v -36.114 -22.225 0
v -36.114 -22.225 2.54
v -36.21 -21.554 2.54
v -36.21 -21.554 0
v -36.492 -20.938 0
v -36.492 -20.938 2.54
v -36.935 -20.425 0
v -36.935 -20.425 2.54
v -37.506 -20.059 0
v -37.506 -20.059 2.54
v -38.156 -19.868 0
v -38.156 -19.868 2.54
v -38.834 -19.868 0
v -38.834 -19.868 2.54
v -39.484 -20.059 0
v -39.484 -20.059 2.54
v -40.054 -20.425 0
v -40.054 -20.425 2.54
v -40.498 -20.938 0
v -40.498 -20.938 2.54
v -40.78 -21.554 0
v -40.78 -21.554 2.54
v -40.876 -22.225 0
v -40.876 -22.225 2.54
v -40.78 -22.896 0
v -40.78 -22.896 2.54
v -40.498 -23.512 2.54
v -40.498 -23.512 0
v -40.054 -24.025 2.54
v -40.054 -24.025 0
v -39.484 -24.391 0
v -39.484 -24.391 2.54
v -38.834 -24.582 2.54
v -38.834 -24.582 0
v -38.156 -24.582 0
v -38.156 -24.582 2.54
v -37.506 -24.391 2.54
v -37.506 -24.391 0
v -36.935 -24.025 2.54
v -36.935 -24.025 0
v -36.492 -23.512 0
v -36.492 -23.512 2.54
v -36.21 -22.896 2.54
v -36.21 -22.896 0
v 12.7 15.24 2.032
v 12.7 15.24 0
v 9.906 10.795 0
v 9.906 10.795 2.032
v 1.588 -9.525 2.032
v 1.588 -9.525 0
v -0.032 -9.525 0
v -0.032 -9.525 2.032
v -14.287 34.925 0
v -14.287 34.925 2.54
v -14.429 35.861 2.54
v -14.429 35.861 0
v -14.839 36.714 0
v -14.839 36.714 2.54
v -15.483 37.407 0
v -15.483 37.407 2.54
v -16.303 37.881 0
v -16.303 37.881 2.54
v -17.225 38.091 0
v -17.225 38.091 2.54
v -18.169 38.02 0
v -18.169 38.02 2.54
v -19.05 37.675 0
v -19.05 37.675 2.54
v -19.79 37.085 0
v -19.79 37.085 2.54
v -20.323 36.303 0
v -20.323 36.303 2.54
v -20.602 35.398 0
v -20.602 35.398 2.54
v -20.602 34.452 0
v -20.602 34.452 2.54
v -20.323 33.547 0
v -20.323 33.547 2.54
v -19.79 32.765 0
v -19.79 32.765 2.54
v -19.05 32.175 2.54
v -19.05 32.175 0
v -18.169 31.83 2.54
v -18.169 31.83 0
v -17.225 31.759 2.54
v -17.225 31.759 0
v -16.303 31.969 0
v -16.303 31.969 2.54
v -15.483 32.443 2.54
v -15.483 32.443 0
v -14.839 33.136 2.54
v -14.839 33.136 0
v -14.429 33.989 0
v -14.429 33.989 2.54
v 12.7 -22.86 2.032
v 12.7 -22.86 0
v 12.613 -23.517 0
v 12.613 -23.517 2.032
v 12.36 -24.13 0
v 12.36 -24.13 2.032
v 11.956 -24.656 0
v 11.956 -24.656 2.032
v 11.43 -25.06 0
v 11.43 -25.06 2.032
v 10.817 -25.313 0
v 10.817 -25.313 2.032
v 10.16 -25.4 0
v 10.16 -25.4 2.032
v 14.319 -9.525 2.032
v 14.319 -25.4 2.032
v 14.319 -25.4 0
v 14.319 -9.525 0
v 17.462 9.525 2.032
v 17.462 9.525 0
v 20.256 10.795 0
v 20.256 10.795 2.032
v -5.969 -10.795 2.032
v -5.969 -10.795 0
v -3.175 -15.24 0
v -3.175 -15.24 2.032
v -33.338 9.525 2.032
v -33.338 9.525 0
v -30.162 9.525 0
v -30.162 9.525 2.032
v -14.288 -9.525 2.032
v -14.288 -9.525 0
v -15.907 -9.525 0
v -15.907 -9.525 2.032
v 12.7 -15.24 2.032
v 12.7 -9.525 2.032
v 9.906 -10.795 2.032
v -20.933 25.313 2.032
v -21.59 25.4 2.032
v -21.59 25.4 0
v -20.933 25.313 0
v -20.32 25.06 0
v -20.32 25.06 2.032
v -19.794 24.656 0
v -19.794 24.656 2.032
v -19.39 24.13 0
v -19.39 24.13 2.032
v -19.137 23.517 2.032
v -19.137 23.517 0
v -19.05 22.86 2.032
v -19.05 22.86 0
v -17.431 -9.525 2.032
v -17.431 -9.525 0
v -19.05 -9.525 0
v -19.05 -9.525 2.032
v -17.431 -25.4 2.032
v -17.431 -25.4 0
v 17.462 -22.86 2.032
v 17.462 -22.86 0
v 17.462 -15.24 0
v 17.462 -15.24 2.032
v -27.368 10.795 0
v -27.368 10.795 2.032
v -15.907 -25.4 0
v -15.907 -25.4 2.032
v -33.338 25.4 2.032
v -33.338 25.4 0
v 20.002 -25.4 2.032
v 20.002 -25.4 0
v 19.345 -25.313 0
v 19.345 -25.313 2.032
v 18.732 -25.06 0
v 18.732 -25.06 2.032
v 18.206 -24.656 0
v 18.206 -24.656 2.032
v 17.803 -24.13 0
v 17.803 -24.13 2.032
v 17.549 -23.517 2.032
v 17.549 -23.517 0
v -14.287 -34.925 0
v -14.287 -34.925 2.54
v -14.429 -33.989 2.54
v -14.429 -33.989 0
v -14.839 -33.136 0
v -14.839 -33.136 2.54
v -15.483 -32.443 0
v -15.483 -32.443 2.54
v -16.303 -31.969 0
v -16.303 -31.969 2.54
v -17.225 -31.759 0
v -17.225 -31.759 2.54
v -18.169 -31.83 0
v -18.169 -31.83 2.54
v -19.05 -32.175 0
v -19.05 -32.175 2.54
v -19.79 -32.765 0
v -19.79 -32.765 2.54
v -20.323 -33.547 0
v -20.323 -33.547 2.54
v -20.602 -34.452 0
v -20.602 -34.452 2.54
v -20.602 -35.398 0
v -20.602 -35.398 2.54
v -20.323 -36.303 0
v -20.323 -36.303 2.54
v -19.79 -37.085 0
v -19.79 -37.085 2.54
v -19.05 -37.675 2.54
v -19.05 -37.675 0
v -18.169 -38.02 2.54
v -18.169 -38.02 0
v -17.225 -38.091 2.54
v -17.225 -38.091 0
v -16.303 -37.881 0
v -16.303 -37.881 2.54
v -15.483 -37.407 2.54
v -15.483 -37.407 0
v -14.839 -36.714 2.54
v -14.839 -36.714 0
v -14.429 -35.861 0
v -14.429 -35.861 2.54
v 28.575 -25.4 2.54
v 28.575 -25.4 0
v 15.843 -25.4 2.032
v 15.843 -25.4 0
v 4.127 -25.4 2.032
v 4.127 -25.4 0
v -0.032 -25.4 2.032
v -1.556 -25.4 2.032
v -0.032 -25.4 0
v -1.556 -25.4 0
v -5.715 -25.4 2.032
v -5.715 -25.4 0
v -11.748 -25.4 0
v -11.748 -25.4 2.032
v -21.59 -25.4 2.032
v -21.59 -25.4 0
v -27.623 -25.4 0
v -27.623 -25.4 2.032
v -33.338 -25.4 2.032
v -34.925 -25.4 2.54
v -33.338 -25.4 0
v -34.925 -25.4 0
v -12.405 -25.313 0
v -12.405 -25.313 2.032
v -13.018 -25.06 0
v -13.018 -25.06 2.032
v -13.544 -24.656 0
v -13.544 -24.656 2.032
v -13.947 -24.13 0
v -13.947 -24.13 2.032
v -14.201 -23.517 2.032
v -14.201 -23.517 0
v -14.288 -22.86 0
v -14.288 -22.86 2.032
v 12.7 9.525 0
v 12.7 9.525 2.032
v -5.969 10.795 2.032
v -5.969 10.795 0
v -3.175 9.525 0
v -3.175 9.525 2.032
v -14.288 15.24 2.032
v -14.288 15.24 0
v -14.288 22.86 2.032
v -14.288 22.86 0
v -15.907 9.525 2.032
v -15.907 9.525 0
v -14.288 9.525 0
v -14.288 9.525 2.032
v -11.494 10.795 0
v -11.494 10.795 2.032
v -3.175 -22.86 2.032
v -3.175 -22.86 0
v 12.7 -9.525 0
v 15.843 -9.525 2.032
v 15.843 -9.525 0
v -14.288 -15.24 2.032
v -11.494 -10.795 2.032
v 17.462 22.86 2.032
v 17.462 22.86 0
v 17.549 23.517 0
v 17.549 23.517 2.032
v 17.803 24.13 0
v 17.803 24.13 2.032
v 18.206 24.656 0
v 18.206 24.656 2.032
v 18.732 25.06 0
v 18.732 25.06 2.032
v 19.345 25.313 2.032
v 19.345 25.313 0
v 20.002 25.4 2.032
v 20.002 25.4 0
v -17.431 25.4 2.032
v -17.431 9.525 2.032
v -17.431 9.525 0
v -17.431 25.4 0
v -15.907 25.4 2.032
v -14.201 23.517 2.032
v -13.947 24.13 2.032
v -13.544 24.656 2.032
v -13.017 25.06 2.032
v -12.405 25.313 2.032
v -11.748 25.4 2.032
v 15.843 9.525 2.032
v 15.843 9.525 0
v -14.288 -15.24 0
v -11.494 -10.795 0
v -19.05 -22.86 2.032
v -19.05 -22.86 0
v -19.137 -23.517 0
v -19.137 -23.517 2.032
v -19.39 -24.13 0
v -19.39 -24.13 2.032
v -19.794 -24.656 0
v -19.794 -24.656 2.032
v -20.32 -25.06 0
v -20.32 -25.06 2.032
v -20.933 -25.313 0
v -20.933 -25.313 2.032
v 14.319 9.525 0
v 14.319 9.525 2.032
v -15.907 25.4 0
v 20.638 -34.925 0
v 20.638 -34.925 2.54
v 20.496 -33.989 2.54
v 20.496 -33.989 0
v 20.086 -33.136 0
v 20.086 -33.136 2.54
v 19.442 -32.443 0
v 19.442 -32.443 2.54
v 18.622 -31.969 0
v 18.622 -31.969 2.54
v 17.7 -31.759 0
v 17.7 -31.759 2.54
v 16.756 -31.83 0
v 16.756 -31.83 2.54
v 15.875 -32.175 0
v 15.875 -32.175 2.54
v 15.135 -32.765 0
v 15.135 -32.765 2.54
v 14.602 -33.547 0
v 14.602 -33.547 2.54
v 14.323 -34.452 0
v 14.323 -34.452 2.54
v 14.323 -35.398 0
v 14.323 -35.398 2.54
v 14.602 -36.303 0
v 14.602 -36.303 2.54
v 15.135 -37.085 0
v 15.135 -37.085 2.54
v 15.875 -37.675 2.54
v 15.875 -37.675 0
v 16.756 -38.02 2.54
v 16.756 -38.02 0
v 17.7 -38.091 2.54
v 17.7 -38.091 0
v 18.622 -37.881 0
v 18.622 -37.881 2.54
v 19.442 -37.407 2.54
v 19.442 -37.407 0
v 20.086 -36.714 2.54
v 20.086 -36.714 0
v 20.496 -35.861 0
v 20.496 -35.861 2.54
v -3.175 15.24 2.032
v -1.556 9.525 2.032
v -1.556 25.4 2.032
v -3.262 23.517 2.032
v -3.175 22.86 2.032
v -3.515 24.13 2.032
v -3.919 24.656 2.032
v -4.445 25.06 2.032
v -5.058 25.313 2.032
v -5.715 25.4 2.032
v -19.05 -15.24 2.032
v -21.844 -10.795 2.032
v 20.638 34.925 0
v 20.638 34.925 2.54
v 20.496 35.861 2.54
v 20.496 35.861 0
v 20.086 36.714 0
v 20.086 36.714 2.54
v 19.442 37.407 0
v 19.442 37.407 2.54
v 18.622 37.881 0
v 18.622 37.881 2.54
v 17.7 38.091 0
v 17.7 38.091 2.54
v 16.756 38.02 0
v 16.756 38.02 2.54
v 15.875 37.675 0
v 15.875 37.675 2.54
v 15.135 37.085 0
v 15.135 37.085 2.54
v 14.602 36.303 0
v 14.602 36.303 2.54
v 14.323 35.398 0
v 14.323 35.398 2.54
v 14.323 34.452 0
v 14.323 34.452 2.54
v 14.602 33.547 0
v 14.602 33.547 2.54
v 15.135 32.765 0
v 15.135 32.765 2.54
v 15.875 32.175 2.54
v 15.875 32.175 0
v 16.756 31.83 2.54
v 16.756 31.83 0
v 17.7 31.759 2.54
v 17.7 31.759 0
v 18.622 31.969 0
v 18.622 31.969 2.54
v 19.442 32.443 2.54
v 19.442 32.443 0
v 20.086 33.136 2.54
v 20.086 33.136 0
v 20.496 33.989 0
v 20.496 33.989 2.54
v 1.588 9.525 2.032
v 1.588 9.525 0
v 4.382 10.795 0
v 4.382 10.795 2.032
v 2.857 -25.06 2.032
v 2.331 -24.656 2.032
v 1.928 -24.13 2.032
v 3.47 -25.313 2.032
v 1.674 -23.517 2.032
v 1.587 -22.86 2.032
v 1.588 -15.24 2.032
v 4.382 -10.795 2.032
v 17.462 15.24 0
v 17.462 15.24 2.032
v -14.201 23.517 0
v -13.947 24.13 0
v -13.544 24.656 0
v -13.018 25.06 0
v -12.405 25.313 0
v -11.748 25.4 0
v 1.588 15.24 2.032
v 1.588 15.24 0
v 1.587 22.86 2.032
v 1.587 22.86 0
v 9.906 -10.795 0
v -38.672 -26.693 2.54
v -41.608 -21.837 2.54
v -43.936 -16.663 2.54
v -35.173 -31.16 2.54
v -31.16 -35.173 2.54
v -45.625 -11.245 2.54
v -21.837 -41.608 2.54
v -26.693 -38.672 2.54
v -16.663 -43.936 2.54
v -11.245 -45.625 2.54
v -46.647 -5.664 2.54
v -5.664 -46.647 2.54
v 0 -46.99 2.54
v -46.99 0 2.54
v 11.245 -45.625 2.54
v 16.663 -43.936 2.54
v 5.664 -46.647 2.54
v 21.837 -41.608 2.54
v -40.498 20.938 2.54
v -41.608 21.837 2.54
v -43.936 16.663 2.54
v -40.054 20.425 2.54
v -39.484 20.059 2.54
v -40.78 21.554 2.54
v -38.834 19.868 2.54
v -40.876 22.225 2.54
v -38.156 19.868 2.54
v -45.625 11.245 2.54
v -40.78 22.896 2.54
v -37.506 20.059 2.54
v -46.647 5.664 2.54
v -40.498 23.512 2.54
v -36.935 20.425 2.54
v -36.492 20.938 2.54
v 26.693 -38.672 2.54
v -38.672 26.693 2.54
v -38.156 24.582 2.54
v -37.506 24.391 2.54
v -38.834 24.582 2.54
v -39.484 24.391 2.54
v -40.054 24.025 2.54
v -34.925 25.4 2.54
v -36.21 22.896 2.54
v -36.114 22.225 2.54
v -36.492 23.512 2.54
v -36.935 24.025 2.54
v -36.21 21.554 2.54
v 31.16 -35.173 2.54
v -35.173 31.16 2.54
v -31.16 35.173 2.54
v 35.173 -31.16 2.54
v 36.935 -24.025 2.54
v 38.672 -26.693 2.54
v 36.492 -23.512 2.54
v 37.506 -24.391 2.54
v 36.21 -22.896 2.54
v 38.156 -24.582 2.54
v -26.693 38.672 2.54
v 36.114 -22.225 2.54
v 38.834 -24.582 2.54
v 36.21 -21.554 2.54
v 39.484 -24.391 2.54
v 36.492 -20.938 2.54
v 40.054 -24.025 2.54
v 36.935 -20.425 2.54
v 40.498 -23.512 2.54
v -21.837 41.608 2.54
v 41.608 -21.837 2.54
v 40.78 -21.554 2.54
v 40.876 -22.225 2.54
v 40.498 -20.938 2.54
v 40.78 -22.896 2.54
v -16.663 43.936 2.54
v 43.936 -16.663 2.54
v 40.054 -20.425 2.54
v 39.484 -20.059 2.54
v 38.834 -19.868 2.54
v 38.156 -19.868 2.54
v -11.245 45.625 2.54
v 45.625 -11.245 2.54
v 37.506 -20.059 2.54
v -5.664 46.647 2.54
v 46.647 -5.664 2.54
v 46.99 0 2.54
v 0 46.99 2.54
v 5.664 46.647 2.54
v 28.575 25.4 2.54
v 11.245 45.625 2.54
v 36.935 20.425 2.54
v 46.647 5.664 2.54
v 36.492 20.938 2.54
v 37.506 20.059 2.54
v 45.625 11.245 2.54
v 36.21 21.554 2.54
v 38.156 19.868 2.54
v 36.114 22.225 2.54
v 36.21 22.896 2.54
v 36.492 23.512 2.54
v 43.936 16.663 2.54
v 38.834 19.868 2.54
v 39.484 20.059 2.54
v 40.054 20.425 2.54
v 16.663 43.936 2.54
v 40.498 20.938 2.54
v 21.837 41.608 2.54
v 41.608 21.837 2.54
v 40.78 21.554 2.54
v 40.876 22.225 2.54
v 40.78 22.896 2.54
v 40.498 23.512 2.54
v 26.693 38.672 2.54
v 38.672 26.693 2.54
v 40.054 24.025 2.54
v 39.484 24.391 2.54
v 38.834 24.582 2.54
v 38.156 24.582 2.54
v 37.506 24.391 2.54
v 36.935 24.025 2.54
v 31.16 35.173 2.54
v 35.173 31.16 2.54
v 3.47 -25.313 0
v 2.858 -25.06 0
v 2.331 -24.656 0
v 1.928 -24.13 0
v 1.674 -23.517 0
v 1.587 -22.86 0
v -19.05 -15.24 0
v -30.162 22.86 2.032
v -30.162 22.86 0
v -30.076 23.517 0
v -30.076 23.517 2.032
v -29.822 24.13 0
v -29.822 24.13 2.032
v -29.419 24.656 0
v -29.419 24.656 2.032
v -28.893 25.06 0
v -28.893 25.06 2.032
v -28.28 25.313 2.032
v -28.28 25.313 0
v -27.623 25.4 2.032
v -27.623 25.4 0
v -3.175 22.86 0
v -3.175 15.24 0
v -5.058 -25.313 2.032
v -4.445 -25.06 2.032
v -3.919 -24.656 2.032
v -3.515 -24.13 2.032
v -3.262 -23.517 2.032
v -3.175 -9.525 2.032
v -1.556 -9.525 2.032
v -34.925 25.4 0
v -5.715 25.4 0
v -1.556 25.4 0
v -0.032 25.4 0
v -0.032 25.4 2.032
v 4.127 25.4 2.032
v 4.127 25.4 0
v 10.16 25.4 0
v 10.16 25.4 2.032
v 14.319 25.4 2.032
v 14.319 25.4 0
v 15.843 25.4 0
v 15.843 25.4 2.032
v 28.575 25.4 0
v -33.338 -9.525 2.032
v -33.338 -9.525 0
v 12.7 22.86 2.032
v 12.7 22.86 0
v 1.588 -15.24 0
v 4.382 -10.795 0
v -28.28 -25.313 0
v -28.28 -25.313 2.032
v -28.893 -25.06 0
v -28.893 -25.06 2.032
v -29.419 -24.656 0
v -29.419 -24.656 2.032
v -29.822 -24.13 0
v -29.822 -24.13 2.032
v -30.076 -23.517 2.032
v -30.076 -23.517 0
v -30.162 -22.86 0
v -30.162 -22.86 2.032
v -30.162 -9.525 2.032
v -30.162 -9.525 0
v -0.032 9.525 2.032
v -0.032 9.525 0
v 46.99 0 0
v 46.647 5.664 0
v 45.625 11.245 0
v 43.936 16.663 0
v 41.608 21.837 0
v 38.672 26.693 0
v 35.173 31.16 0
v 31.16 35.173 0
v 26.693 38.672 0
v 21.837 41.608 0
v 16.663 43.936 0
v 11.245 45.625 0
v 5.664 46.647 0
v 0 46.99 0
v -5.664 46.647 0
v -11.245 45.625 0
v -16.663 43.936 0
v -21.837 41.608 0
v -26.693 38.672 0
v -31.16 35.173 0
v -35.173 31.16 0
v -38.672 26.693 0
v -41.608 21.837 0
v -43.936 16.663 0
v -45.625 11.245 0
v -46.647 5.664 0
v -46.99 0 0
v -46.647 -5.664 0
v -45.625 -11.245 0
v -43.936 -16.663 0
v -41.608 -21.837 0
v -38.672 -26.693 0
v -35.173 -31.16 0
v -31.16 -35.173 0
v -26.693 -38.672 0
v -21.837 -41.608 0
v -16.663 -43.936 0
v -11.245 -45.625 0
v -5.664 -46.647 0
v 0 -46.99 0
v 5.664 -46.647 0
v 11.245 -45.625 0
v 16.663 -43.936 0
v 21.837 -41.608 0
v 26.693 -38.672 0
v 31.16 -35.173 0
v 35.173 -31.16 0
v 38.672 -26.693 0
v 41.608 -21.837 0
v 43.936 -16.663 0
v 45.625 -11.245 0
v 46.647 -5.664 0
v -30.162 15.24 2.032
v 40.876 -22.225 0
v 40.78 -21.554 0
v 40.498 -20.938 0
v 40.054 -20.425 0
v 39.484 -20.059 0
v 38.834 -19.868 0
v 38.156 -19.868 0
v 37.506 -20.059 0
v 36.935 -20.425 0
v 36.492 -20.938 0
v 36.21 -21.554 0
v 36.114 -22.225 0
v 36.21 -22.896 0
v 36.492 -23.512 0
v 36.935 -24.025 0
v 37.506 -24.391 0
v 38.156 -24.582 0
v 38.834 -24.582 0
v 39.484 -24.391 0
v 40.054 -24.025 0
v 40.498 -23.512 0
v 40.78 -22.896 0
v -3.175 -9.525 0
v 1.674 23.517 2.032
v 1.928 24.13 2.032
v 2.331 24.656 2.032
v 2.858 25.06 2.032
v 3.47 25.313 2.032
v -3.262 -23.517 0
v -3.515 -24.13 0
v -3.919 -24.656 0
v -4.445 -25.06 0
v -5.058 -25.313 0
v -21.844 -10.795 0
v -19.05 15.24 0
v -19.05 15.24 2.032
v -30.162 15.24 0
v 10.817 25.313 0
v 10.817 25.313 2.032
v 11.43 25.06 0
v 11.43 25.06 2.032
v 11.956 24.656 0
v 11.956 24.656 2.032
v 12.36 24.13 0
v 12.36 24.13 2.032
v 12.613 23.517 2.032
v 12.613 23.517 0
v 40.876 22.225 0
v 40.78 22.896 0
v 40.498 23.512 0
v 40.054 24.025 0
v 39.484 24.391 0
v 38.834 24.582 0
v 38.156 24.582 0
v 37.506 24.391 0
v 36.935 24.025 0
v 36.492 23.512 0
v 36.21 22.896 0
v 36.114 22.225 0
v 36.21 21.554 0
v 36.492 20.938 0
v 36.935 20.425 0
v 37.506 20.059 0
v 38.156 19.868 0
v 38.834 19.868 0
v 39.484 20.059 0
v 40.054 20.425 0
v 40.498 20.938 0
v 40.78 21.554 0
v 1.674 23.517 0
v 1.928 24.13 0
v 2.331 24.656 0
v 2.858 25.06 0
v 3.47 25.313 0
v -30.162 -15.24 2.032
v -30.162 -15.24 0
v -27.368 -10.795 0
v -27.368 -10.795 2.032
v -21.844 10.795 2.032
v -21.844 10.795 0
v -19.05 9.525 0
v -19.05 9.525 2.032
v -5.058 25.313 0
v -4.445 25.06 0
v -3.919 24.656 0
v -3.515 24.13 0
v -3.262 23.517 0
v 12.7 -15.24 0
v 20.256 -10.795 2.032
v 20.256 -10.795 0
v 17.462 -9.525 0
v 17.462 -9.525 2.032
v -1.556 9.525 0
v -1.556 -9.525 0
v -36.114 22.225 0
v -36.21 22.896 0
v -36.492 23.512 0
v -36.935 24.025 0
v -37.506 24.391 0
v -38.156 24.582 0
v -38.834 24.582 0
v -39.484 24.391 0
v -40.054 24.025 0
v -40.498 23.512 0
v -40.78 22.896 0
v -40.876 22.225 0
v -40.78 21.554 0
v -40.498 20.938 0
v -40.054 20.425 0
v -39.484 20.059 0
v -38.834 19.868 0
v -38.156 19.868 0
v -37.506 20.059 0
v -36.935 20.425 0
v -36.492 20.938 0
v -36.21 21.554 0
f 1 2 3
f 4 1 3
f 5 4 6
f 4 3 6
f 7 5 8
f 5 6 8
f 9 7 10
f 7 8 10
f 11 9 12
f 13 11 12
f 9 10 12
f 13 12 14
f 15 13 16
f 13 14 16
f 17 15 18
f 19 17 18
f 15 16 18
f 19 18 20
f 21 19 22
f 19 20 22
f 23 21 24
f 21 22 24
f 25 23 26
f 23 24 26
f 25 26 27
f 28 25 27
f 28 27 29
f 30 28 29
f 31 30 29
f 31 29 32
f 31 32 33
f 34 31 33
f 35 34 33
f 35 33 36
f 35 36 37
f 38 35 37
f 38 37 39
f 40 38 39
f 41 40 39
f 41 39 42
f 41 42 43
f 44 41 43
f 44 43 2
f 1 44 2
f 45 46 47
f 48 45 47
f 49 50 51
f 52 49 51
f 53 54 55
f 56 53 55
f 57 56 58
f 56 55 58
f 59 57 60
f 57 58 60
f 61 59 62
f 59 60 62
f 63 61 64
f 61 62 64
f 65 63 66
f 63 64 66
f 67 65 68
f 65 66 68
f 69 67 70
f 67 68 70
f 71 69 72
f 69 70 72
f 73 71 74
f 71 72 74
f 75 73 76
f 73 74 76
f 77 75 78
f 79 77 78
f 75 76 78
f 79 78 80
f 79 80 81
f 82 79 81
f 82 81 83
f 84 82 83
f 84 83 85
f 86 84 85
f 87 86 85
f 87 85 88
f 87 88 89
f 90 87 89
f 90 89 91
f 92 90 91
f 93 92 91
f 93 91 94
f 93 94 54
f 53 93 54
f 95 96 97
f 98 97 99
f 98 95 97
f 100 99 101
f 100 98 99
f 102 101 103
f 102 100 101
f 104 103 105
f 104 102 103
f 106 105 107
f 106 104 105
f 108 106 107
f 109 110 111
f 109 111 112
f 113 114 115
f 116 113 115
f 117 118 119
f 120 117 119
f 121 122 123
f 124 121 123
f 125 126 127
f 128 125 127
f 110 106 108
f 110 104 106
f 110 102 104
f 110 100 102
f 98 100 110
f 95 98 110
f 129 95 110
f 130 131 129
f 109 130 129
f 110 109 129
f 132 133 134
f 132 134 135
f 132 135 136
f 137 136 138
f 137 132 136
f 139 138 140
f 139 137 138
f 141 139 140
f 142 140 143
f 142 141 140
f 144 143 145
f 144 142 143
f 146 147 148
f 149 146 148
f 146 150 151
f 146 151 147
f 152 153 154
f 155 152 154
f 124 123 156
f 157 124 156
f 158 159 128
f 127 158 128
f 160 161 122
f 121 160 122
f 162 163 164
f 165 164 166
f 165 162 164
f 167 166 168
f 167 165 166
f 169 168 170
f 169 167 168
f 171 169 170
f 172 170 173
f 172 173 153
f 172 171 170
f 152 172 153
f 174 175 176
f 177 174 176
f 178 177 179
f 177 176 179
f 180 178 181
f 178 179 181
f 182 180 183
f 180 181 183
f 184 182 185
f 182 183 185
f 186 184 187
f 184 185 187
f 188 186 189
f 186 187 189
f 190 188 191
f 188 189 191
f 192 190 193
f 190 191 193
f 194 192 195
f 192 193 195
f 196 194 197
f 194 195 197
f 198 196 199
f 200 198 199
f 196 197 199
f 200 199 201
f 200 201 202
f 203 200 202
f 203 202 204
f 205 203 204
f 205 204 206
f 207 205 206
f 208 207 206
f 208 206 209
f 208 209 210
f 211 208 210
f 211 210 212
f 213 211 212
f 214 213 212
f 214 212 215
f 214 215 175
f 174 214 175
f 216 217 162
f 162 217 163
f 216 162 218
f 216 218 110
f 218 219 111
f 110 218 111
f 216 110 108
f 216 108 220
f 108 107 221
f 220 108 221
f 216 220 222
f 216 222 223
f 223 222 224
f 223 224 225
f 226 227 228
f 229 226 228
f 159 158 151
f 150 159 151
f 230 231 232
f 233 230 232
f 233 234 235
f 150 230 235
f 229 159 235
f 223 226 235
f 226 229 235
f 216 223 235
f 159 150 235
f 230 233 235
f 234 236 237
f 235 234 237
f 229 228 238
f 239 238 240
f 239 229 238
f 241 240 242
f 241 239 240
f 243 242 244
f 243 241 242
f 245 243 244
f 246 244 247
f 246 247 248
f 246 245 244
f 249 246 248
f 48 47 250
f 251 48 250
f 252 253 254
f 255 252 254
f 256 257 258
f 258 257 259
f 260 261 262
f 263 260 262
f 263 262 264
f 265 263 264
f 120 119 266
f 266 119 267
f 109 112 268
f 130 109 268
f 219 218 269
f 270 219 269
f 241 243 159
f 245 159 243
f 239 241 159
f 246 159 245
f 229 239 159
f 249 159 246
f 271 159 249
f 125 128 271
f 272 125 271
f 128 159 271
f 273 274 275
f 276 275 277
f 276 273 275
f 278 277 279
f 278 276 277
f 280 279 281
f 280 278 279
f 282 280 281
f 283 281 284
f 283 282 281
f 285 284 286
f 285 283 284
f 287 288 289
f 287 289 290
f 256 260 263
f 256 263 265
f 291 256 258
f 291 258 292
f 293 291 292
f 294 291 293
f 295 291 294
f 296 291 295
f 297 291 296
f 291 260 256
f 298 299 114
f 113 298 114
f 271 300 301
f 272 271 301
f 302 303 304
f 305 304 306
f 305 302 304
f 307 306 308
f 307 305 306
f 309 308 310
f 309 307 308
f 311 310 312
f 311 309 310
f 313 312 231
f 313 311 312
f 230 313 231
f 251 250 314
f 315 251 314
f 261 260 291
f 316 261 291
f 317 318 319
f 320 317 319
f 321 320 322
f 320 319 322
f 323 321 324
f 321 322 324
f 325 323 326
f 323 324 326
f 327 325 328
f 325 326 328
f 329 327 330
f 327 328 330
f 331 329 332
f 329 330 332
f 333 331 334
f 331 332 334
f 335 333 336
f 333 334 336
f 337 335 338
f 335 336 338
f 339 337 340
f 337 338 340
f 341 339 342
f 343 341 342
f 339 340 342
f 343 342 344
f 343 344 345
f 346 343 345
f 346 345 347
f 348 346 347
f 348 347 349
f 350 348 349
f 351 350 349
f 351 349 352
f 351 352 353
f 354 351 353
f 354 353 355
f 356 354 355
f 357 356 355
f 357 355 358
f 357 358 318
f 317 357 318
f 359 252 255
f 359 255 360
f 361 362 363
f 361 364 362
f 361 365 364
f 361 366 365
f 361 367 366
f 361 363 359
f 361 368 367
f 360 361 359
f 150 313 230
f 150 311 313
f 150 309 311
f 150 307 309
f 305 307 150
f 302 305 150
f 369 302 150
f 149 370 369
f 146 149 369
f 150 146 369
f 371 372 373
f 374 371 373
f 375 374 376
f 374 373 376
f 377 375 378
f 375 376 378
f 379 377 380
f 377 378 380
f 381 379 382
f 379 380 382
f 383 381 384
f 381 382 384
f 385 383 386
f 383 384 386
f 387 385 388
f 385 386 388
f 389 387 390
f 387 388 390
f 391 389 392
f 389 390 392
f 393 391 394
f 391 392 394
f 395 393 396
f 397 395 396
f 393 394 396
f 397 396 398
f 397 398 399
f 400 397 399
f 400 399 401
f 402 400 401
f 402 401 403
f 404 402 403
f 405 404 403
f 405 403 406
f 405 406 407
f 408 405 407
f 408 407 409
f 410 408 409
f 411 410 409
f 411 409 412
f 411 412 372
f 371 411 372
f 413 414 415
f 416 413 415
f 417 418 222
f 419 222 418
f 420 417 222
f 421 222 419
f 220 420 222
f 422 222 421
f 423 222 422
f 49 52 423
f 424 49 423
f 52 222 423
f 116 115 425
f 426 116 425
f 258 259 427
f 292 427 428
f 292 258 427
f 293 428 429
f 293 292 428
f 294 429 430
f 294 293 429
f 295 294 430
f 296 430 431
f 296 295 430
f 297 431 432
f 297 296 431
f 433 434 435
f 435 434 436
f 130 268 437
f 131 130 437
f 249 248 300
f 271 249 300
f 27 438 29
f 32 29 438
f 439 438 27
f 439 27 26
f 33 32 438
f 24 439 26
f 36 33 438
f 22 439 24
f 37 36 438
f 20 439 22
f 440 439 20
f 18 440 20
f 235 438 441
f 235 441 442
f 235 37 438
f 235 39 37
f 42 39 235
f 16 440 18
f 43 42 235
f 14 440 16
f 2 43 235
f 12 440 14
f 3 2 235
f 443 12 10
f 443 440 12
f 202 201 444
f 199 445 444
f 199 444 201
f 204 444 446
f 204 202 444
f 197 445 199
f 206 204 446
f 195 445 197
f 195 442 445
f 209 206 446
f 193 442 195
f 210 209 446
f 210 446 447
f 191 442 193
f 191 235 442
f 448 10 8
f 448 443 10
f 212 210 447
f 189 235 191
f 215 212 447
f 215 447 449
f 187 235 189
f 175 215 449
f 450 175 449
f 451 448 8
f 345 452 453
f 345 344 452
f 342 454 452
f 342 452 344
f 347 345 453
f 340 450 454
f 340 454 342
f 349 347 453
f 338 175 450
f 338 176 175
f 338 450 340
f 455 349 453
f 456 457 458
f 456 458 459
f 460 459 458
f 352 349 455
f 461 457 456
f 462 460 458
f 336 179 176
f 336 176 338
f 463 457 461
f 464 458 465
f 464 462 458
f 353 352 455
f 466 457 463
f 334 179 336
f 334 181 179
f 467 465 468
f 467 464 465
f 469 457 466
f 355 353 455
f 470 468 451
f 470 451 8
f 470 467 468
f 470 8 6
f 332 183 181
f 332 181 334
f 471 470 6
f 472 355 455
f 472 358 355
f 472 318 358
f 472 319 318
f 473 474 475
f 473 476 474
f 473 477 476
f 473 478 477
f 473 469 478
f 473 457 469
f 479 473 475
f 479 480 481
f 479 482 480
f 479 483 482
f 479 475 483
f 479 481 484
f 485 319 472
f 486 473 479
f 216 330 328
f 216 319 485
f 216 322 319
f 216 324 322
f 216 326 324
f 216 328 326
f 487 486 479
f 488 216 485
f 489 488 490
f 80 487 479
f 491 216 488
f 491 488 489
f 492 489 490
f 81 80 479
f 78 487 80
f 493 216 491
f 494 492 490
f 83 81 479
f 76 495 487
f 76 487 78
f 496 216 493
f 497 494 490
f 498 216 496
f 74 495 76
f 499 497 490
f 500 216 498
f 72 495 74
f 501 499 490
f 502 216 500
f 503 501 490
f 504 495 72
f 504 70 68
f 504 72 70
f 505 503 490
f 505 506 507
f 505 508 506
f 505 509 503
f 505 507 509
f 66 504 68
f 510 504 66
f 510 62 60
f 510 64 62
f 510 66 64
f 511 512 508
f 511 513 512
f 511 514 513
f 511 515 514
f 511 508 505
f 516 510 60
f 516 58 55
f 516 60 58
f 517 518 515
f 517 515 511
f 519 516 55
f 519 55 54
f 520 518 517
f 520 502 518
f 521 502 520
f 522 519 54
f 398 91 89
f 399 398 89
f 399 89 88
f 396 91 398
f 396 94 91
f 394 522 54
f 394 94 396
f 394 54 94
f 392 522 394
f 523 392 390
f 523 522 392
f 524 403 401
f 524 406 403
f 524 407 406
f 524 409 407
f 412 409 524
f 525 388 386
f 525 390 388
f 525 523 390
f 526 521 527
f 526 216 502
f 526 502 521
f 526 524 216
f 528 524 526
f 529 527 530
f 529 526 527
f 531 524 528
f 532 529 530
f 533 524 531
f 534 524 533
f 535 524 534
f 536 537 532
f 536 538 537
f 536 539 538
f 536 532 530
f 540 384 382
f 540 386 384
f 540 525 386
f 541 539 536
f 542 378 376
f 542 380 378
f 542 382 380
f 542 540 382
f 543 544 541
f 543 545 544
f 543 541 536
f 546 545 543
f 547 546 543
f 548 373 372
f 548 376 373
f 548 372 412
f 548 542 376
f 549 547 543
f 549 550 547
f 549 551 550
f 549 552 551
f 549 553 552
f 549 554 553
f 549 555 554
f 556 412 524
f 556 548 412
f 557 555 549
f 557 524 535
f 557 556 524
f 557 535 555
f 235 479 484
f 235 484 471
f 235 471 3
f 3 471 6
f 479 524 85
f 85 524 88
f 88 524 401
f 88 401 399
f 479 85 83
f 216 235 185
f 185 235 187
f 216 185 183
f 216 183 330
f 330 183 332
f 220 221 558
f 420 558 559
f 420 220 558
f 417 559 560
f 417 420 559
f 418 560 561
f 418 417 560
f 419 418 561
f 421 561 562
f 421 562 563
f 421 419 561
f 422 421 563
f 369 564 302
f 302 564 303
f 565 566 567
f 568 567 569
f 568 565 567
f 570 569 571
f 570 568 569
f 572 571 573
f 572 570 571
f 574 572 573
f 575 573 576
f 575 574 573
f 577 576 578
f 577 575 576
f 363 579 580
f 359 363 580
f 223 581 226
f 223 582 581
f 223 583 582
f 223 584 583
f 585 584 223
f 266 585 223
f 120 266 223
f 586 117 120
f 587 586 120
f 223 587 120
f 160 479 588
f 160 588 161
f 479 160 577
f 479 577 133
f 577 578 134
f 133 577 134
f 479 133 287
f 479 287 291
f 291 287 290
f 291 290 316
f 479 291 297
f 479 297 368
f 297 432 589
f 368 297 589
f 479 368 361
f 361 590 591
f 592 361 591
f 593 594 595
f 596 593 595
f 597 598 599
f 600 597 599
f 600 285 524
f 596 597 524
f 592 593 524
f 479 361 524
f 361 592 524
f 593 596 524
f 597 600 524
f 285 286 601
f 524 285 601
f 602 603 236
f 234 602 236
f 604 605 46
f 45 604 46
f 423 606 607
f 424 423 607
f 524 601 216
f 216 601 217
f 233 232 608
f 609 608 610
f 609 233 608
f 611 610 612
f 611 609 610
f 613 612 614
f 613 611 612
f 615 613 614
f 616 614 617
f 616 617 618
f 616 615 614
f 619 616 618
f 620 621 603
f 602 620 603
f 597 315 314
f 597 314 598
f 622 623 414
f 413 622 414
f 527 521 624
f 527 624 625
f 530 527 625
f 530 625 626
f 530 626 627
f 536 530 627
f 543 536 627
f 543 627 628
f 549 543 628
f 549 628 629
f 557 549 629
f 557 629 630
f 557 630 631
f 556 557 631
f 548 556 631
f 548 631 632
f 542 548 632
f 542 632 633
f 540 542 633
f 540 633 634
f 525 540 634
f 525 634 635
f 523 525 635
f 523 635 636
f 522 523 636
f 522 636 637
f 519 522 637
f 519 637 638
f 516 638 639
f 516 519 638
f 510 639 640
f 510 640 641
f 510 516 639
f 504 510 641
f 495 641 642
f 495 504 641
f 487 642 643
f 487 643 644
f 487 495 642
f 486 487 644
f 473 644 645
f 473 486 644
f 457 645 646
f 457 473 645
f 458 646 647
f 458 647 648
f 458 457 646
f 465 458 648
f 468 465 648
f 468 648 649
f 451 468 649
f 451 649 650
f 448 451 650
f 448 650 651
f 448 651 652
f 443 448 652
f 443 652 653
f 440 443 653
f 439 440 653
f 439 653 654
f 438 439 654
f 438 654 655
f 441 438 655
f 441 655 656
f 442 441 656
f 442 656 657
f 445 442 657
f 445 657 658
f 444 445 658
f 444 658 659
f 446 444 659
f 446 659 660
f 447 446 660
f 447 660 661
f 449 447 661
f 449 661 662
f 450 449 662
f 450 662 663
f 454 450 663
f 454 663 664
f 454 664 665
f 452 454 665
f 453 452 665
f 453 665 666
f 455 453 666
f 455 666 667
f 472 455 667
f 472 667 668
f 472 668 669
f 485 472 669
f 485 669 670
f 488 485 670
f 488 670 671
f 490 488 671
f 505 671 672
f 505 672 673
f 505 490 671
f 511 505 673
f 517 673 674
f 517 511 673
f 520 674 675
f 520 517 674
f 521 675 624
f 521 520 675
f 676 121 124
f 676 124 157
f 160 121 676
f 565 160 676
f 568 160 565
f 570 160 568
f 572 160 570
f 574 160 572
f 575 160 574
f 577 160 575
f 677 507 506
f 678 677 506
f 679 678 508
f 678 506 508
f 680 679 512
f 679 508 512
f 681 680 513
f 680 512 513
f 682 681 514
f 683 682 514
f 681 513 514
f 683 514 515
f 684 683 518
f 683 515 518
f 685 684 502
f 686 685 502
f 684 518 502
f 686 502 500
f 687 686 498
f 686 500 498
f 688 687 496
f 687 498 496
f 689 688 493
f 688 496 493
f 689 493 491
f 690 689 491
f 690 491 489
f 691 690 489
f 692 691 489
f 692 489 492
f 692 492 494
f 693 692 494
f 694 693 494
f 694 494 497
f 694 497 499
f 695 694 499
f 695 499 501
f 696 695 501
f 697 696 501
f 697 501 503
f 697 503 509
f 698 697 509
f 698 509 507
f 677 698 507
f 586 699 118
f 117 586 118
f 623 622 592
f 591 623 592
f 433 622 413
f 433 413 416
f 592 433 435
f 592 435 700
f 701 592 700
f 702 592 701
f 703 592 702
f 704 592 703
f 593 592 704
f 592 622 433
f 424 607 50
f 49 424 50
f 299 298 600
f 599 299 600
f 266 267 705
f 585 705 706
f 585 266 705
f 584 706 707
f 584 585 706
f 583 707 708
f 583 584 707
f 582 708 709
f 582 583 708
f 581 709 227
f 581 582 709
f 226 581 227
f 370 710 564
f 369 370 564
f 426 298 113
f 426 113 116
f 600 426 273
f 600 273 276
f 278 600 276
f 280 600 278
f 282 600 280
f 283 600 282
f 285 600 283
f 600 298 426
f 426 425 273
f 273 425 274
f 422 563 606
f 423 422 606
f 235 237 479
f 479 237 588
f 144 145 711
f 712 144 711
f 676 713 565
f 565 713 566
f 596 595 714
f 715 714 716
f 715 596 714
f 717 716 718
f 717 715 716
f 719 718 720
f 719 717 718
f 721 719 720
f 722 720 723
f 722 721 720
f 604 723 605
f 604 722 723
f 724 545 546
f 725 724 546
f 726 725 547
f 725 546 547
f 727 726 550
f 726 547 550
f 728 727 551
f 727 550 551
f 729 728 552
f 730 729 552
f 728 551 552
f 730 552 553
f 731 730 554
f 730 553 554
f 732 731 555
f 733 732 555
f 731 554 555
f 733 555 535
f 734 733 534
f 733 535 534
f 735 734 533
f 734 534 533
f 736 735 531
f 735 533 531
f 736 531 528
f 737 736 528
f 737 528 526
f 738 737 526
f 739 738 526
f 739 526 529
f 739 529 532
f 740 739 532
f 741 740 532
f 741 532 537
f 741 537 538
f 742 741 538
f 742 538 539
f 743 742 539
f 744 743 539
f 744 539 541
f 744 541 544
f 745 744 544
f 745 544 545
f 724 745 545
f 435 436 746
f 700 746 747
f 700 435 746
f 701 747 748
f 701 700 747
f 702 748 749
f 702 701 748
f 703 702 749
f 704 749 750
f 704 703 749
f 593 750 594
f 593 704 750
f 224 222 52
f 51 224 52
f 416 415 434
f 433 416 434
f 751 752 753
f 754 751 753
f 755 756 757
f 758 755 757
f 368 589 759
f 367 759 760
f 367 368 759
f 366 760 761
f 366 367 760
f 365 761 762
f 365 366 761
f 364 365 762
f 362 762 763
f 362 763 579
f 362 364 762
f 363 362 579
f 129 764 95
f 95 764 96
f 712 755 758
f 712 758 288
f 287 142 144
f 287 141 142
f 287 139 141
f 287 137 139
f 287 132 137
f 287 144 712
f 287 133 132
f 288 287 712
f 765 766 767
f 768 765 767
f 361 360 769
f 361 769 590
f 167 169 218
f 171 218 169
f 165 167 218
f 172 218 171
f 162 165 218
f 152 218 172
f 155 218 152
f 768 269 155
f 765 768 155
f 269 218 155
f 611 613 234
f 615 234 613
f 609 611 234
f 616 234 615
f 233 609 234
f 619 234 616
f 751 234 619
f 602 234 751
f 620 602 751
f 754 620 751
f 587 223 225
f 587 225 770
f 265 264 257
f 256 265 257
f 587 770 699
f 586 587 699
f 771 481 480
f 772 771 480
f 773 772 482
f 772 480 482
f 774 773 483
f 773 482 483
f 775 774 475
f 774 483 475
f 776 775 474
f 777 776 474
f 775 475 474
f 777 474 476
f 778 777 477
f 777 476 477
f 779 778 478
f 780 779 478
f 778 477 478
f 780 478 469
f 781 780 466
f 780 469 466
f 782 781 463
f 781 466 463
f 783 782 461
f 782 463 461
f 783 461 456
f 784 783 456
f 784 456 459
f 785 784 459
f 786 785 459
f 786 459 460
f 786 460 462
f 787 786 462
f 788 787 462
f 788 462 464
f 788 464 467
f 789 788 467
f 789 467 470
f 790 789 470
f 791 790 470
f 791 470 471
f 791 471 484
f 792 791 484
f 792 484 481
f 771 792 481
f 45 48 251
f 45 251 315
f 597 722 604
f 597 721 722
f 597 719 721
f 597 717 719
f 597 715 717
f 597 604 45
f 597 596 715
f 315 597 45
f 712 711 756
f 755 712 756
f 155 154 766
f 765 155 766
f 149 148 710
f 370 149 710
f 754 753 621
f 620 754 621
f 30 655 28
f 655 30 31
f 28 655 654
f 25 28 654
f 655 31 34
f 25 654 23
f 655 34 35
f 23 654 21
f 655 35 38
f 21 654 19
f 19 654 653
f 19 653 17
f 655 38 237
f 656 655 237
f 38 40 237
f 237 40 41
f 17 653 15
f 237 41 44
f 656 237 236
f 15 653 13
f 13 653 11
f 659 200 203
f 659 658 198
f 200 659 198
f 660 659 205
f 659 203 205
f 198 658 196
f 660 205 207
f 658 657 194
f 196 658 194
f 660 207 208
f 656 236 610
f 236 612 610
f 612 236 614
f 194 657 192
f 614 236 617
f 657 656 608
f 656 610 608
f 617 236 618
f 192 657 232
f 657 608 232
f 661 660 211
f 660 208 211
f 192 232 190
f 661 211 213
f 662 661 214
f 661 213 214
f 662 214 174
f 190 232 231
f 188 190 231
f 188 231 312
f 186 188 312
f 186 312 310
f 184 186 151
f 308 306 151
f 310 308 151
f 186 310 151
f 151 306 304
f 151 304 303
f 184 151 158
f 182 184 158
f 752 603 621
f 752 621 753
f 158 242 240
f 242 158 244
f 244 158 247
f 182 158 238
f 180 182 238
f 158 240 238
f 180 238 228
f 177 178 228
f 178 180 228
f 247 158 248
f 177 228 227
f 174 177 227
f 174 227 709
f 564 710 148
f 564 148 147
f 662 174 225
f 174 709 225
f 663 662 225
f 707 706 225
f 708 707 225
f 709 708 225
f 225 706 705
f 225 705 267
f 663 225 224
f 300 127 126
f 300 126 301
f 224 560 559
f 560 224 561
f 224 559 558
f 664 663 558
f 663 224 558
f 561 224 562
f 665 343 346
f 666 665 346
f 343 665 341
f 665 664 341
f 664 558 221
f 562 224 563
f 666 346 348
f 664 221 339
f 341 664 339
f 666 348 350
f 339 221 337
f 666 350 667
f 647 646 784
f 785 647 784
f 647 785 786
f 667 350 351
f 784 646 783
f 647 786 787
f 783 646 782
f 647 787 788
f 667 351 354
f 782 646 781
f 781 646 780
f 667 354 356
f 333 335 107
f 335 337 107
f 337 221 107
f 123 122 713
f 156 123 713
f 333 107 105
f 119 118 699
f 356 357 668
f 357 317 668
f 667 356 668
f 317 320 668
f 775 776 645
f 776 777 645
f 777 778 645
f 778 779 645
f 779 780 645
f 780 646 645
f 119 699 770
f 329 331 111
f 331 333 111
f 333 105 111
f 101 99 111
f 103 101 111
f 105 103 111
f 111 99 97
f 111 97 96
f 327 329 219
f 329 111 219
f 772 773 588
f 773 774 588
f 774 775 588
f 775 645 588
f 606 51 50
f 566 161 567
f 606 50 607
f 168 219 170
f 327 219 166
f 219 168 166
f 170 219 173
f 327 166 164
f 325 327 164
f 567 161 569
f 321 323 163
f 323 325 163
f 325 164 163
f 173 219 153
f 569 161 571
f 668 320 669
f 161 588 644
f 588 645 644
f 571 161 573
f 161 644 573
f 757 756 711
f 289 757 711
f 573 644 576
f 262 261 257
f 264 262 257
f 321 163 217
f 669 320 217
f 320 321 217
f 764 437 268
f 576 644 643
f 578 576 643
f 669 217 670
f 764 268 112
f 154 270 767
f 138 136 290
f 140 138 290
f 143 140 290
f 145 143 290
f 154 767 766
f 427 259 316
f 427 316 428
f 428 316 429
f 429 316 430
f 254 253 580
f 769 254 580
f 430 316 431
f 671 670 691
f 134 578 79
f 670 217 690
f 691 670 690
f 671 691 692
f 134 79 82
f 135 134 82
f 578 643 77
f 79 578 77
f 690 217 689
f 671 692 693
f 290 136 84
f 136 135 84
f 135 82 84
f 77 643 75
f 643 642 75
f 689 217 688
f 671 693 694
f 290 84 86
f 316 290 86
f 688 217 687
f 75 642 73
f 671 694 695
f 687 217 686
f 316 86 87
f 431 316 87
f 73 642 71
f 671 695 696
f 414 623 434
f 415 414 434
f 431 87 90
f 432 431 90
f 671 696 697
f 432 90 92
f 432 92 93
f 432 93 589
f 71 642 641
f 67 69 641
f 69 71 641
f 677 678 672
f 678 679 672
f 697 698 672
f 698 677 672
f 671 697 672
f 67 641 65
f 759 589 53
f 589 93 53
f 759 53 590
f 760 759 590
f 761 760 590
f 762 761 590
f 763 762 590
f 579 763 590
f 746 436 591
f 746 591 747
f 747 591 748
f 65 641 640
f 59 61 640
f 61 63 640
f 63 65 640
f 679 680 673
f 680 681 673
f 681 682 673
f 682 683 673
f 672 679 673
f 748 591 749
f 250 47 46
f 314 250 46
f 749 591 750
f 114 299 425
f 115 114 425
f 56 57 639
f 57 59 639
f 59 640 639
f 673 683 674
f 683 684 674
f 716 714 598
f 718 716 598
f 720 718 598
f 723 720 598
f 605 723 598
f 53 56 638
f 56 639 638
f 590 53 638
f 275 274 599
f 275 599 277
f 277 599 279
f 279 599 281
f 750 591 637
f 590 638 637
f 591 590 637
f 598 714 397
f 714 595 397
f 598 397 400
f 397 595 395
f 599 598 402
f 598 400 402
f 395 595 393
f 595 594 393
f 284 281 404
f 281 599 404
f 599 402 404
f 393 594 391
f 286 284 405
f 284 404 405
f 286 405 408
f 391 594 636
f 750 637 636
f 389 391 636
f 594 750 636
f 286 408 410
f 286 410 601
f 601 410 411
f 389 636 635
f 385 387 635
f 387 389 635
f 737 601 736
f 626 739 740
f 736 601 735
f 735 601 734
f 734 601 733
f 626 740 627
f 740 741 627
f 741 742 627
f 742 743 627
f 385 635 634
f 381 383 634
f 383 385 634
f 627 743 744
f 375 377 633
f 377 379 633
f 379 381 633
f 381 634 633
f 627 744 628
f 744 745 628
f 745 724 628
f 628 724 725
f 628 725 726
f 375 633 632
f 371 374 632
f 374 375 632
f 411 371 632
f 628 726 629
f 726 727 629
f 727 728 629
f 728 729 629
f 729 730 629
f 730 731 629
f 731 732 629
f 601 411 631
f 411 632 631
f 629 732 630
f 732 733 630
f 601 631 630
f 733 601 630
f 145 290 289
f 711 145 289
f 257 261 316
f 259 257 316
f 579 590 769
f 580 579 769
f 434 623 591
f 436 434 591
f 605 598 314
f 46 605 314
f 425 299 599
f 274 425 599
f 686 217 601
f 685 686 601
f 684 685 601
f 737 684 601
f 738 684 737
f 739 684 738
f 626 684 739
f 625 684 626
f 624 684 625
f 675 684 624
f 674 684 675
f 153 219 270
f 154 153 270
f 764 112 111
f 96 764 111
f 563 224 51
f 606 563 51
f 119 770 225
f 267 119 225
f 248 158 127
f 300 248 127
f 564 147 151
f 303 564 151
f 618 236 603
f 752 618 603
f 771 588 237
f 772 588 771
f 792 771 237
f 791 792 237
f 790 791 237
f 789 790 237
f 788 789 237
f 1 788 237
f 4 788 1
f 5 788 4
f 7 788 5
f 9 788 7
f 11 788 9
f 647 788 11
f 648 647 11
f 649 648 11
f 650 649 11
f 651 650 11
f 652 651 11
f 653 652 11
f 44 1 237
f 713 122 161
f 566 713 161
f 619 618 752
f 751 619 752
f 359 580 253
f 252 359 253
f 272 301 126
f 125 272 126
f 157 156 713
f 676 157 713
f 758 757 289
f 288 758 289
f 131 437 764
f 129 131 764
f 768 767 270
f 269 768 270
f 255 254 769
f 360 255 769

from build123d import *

# Parameters (mm, degrees)
F0_R     = 52.3875
F1_DEPTH = 2.54
F2_R     = 2.54
F3_W     = 63.5
F3_H     = 50.8
F4_DEPTH = 0.508
F5_R     = 52.3875
F5_R_2   = 46.99
F5_R_3   = 2.38125
F5_R_4   = 3.175
F6_DEPTH = 25.4
F7_W     = 1.524
F7_H     = 15.875
F8_DEPTH = 25.4


# Not quite as in the source:
# - a feature names something its author has since deleted; it is built from what else it names


with BuildPart() as f1:
    # F0 (on Top) → F1 (new body)
    with BuildSketch(Plane.XY):
        Circle(F0_R)
        Polygon((-34.925, 25.4), (-33.3375, 25.4), (-30.1625, 25.4), (-19.05, 25.4), (-19.05, 15.24), (-21.844, 10.795), (-19.05, 9.525), (-17.4625, 9.525), (-14.2875, 9.525), (-11.4935, 10.795), (-14.2875, 15.24), (-14.2875, 25.4), (-3.175, 25.4), (-3.175, 15.24), (-5.969, 10.795), (-3.175, 9.525), (-1.5875, 9.525), (1.5875, 9.525), (4.3815, 10.795), (1.5875, 15.24), (1.5875, 25.4), (12.7, 25.4), (12.7, 15.24), (9.906, 10.795), (12.7, 9.525), (14.2875, 9.525), (17.4625, 9.525), (20.2565, 10.795), (17.4625, 15.24), (17.4625, 25.4), (28.575, 25.4), (28.575, -25.4), (17.4625, -25.4), (17.4625, -15.24), (20.2565, -10.795), (17.4625, -9.525), (14.2875, -9.525), (12.7, -9.525), (9.906, -10.795), (12.7, -15.24), (12.7, -25.4), (1.5875, -25.4), (1.5875, -15.24), (4.3815, -10.795), (1.5875, -9.525), (-1.5875, -9.525), (-3.175, -9.525), (-5.969, -10.795), (-3.175, -15.24), (-3.175, -25.4), (-14.2875, -25.4), (-14.2875, -15.24), (-11.4935, -10.795), (-14.2875, -9.525), (-17.4625, -9.525), (-19.05, -9.525), (-21.844, -10.795), (-19.05, -15.24), (-19.05, -25.4), (-30.1625, -25.4), (-33.3375, -25.4), (-34.925, -25.4), align=None, mode=Mode.SUBTRACT)
        Polygon((-33.3375, 9.525), (-30.1625, 9.525), (-27.3685, 10.795), (-30.1625, 15.24), (-30.1625, 25.4), (-33.3375, 25.4), align=None)
        Polygon((-33.3375, -9.525), (-33.3375, -25.4), (-30.1625, -25.4), (-30.1625, -15.24), (-27.3685, -10.795), (-30.1625, -9.525), align=None)
    extrude(amount=F1_DEPTH)

    # F2
    f2_edges = [f1.edges().sort_by_distance(p)[0] for p in [
        (-30.1625, 25.4, 1.27),
        (-14.2875, 25.4, 1.27),
        (1.5875, 25.4, 1.27),
        (17.4625, 25.4, 1.27),
        (17.4625, -25.4, 1.27),
        (1.5875, -25.4, 1.27),
        (-14.2875, -25.4, 1.27),
        (-30.1625, -25.4, 1.27),
        (-19.05, -25.4, 1.27),
        (-3.175, -25.4, 1.27),
        (12.7, -25.4, 1.27),
        (12.7, 25.4, 1.27),
        (-3.175, 25.4, 1.27),
        (-19.05, 25.4, 1.27),
    ]]
    fillet(f2_edges, radius=F2_R)

    # F3 (on face) → F4 (cut)
    with BuildSketch(Plane.XY.offset(2.54)):
        with Locations((-3.175, 0)):
            Rectangle(F3_W, F3_H)
    extrude(amount=-F4_DEPTH, mode=Mode.SUBTRACT)

    # F5 (on face) → F6 (cut)
    with BuildSketch(Plane.XY.offset(2.54)):
        Circle(F5_R)
        Circle(F5_R_2, mode=Mode.SUBTRACT)
        with Locations((-38.4948291982, 22.225)):
            Circle(F5_R_3)
        with Locations((-38.4948291982, -22.225)):
            Circle(F5_R_3)
        with Locations((38.4948291982, -22.225)):
            Circle(F5_R_3)
        with Locations((38.4948291982, 22.225)):
            Circle(F5_R_3)
        with Locations((17.4625, -34.925)):
            Circle(F5_R_4)
        with Locations((17.4625, 34.925)):
            Circle(F5_R_4)
        with Locations((-17.4625, 34.925)):
            Circle(F5_R_4)
        with Locations((-17.4625, -34.925)):
            Circle(F5_R_4)
    extrude(amount=-F6_DEPTH, mode=Mode.SUBTRACT)

    # F7 (on face) → F8 (cut)
    with BuildSketch(Plane.XY.offset(2.54)):
        with Locations((-16.66875, 17.4625)):
            Rectangle(F7_W, F7_H)
        with Locations((-0.79375, 17.4625)):
            Rectangle(F7_W, F7_H)
        with Locations((15.08125, 17.4625)):
            Rectangle(F7_W, F7_H)
        with Locations((-16.66875, -17.4625)):
            Rectangle(F7_W, F7_H)
        with Locations((-0.79375, -17.4625)):
            Rectangle(F7_W, F7_H)
        with Locations((15.08125, -17.4625)):
            Rectangle(F7_W, F7_H)
    extrude(amount=-F8_DEPTH, mode=Mode.SUBTRACT)


solid = f1.part
